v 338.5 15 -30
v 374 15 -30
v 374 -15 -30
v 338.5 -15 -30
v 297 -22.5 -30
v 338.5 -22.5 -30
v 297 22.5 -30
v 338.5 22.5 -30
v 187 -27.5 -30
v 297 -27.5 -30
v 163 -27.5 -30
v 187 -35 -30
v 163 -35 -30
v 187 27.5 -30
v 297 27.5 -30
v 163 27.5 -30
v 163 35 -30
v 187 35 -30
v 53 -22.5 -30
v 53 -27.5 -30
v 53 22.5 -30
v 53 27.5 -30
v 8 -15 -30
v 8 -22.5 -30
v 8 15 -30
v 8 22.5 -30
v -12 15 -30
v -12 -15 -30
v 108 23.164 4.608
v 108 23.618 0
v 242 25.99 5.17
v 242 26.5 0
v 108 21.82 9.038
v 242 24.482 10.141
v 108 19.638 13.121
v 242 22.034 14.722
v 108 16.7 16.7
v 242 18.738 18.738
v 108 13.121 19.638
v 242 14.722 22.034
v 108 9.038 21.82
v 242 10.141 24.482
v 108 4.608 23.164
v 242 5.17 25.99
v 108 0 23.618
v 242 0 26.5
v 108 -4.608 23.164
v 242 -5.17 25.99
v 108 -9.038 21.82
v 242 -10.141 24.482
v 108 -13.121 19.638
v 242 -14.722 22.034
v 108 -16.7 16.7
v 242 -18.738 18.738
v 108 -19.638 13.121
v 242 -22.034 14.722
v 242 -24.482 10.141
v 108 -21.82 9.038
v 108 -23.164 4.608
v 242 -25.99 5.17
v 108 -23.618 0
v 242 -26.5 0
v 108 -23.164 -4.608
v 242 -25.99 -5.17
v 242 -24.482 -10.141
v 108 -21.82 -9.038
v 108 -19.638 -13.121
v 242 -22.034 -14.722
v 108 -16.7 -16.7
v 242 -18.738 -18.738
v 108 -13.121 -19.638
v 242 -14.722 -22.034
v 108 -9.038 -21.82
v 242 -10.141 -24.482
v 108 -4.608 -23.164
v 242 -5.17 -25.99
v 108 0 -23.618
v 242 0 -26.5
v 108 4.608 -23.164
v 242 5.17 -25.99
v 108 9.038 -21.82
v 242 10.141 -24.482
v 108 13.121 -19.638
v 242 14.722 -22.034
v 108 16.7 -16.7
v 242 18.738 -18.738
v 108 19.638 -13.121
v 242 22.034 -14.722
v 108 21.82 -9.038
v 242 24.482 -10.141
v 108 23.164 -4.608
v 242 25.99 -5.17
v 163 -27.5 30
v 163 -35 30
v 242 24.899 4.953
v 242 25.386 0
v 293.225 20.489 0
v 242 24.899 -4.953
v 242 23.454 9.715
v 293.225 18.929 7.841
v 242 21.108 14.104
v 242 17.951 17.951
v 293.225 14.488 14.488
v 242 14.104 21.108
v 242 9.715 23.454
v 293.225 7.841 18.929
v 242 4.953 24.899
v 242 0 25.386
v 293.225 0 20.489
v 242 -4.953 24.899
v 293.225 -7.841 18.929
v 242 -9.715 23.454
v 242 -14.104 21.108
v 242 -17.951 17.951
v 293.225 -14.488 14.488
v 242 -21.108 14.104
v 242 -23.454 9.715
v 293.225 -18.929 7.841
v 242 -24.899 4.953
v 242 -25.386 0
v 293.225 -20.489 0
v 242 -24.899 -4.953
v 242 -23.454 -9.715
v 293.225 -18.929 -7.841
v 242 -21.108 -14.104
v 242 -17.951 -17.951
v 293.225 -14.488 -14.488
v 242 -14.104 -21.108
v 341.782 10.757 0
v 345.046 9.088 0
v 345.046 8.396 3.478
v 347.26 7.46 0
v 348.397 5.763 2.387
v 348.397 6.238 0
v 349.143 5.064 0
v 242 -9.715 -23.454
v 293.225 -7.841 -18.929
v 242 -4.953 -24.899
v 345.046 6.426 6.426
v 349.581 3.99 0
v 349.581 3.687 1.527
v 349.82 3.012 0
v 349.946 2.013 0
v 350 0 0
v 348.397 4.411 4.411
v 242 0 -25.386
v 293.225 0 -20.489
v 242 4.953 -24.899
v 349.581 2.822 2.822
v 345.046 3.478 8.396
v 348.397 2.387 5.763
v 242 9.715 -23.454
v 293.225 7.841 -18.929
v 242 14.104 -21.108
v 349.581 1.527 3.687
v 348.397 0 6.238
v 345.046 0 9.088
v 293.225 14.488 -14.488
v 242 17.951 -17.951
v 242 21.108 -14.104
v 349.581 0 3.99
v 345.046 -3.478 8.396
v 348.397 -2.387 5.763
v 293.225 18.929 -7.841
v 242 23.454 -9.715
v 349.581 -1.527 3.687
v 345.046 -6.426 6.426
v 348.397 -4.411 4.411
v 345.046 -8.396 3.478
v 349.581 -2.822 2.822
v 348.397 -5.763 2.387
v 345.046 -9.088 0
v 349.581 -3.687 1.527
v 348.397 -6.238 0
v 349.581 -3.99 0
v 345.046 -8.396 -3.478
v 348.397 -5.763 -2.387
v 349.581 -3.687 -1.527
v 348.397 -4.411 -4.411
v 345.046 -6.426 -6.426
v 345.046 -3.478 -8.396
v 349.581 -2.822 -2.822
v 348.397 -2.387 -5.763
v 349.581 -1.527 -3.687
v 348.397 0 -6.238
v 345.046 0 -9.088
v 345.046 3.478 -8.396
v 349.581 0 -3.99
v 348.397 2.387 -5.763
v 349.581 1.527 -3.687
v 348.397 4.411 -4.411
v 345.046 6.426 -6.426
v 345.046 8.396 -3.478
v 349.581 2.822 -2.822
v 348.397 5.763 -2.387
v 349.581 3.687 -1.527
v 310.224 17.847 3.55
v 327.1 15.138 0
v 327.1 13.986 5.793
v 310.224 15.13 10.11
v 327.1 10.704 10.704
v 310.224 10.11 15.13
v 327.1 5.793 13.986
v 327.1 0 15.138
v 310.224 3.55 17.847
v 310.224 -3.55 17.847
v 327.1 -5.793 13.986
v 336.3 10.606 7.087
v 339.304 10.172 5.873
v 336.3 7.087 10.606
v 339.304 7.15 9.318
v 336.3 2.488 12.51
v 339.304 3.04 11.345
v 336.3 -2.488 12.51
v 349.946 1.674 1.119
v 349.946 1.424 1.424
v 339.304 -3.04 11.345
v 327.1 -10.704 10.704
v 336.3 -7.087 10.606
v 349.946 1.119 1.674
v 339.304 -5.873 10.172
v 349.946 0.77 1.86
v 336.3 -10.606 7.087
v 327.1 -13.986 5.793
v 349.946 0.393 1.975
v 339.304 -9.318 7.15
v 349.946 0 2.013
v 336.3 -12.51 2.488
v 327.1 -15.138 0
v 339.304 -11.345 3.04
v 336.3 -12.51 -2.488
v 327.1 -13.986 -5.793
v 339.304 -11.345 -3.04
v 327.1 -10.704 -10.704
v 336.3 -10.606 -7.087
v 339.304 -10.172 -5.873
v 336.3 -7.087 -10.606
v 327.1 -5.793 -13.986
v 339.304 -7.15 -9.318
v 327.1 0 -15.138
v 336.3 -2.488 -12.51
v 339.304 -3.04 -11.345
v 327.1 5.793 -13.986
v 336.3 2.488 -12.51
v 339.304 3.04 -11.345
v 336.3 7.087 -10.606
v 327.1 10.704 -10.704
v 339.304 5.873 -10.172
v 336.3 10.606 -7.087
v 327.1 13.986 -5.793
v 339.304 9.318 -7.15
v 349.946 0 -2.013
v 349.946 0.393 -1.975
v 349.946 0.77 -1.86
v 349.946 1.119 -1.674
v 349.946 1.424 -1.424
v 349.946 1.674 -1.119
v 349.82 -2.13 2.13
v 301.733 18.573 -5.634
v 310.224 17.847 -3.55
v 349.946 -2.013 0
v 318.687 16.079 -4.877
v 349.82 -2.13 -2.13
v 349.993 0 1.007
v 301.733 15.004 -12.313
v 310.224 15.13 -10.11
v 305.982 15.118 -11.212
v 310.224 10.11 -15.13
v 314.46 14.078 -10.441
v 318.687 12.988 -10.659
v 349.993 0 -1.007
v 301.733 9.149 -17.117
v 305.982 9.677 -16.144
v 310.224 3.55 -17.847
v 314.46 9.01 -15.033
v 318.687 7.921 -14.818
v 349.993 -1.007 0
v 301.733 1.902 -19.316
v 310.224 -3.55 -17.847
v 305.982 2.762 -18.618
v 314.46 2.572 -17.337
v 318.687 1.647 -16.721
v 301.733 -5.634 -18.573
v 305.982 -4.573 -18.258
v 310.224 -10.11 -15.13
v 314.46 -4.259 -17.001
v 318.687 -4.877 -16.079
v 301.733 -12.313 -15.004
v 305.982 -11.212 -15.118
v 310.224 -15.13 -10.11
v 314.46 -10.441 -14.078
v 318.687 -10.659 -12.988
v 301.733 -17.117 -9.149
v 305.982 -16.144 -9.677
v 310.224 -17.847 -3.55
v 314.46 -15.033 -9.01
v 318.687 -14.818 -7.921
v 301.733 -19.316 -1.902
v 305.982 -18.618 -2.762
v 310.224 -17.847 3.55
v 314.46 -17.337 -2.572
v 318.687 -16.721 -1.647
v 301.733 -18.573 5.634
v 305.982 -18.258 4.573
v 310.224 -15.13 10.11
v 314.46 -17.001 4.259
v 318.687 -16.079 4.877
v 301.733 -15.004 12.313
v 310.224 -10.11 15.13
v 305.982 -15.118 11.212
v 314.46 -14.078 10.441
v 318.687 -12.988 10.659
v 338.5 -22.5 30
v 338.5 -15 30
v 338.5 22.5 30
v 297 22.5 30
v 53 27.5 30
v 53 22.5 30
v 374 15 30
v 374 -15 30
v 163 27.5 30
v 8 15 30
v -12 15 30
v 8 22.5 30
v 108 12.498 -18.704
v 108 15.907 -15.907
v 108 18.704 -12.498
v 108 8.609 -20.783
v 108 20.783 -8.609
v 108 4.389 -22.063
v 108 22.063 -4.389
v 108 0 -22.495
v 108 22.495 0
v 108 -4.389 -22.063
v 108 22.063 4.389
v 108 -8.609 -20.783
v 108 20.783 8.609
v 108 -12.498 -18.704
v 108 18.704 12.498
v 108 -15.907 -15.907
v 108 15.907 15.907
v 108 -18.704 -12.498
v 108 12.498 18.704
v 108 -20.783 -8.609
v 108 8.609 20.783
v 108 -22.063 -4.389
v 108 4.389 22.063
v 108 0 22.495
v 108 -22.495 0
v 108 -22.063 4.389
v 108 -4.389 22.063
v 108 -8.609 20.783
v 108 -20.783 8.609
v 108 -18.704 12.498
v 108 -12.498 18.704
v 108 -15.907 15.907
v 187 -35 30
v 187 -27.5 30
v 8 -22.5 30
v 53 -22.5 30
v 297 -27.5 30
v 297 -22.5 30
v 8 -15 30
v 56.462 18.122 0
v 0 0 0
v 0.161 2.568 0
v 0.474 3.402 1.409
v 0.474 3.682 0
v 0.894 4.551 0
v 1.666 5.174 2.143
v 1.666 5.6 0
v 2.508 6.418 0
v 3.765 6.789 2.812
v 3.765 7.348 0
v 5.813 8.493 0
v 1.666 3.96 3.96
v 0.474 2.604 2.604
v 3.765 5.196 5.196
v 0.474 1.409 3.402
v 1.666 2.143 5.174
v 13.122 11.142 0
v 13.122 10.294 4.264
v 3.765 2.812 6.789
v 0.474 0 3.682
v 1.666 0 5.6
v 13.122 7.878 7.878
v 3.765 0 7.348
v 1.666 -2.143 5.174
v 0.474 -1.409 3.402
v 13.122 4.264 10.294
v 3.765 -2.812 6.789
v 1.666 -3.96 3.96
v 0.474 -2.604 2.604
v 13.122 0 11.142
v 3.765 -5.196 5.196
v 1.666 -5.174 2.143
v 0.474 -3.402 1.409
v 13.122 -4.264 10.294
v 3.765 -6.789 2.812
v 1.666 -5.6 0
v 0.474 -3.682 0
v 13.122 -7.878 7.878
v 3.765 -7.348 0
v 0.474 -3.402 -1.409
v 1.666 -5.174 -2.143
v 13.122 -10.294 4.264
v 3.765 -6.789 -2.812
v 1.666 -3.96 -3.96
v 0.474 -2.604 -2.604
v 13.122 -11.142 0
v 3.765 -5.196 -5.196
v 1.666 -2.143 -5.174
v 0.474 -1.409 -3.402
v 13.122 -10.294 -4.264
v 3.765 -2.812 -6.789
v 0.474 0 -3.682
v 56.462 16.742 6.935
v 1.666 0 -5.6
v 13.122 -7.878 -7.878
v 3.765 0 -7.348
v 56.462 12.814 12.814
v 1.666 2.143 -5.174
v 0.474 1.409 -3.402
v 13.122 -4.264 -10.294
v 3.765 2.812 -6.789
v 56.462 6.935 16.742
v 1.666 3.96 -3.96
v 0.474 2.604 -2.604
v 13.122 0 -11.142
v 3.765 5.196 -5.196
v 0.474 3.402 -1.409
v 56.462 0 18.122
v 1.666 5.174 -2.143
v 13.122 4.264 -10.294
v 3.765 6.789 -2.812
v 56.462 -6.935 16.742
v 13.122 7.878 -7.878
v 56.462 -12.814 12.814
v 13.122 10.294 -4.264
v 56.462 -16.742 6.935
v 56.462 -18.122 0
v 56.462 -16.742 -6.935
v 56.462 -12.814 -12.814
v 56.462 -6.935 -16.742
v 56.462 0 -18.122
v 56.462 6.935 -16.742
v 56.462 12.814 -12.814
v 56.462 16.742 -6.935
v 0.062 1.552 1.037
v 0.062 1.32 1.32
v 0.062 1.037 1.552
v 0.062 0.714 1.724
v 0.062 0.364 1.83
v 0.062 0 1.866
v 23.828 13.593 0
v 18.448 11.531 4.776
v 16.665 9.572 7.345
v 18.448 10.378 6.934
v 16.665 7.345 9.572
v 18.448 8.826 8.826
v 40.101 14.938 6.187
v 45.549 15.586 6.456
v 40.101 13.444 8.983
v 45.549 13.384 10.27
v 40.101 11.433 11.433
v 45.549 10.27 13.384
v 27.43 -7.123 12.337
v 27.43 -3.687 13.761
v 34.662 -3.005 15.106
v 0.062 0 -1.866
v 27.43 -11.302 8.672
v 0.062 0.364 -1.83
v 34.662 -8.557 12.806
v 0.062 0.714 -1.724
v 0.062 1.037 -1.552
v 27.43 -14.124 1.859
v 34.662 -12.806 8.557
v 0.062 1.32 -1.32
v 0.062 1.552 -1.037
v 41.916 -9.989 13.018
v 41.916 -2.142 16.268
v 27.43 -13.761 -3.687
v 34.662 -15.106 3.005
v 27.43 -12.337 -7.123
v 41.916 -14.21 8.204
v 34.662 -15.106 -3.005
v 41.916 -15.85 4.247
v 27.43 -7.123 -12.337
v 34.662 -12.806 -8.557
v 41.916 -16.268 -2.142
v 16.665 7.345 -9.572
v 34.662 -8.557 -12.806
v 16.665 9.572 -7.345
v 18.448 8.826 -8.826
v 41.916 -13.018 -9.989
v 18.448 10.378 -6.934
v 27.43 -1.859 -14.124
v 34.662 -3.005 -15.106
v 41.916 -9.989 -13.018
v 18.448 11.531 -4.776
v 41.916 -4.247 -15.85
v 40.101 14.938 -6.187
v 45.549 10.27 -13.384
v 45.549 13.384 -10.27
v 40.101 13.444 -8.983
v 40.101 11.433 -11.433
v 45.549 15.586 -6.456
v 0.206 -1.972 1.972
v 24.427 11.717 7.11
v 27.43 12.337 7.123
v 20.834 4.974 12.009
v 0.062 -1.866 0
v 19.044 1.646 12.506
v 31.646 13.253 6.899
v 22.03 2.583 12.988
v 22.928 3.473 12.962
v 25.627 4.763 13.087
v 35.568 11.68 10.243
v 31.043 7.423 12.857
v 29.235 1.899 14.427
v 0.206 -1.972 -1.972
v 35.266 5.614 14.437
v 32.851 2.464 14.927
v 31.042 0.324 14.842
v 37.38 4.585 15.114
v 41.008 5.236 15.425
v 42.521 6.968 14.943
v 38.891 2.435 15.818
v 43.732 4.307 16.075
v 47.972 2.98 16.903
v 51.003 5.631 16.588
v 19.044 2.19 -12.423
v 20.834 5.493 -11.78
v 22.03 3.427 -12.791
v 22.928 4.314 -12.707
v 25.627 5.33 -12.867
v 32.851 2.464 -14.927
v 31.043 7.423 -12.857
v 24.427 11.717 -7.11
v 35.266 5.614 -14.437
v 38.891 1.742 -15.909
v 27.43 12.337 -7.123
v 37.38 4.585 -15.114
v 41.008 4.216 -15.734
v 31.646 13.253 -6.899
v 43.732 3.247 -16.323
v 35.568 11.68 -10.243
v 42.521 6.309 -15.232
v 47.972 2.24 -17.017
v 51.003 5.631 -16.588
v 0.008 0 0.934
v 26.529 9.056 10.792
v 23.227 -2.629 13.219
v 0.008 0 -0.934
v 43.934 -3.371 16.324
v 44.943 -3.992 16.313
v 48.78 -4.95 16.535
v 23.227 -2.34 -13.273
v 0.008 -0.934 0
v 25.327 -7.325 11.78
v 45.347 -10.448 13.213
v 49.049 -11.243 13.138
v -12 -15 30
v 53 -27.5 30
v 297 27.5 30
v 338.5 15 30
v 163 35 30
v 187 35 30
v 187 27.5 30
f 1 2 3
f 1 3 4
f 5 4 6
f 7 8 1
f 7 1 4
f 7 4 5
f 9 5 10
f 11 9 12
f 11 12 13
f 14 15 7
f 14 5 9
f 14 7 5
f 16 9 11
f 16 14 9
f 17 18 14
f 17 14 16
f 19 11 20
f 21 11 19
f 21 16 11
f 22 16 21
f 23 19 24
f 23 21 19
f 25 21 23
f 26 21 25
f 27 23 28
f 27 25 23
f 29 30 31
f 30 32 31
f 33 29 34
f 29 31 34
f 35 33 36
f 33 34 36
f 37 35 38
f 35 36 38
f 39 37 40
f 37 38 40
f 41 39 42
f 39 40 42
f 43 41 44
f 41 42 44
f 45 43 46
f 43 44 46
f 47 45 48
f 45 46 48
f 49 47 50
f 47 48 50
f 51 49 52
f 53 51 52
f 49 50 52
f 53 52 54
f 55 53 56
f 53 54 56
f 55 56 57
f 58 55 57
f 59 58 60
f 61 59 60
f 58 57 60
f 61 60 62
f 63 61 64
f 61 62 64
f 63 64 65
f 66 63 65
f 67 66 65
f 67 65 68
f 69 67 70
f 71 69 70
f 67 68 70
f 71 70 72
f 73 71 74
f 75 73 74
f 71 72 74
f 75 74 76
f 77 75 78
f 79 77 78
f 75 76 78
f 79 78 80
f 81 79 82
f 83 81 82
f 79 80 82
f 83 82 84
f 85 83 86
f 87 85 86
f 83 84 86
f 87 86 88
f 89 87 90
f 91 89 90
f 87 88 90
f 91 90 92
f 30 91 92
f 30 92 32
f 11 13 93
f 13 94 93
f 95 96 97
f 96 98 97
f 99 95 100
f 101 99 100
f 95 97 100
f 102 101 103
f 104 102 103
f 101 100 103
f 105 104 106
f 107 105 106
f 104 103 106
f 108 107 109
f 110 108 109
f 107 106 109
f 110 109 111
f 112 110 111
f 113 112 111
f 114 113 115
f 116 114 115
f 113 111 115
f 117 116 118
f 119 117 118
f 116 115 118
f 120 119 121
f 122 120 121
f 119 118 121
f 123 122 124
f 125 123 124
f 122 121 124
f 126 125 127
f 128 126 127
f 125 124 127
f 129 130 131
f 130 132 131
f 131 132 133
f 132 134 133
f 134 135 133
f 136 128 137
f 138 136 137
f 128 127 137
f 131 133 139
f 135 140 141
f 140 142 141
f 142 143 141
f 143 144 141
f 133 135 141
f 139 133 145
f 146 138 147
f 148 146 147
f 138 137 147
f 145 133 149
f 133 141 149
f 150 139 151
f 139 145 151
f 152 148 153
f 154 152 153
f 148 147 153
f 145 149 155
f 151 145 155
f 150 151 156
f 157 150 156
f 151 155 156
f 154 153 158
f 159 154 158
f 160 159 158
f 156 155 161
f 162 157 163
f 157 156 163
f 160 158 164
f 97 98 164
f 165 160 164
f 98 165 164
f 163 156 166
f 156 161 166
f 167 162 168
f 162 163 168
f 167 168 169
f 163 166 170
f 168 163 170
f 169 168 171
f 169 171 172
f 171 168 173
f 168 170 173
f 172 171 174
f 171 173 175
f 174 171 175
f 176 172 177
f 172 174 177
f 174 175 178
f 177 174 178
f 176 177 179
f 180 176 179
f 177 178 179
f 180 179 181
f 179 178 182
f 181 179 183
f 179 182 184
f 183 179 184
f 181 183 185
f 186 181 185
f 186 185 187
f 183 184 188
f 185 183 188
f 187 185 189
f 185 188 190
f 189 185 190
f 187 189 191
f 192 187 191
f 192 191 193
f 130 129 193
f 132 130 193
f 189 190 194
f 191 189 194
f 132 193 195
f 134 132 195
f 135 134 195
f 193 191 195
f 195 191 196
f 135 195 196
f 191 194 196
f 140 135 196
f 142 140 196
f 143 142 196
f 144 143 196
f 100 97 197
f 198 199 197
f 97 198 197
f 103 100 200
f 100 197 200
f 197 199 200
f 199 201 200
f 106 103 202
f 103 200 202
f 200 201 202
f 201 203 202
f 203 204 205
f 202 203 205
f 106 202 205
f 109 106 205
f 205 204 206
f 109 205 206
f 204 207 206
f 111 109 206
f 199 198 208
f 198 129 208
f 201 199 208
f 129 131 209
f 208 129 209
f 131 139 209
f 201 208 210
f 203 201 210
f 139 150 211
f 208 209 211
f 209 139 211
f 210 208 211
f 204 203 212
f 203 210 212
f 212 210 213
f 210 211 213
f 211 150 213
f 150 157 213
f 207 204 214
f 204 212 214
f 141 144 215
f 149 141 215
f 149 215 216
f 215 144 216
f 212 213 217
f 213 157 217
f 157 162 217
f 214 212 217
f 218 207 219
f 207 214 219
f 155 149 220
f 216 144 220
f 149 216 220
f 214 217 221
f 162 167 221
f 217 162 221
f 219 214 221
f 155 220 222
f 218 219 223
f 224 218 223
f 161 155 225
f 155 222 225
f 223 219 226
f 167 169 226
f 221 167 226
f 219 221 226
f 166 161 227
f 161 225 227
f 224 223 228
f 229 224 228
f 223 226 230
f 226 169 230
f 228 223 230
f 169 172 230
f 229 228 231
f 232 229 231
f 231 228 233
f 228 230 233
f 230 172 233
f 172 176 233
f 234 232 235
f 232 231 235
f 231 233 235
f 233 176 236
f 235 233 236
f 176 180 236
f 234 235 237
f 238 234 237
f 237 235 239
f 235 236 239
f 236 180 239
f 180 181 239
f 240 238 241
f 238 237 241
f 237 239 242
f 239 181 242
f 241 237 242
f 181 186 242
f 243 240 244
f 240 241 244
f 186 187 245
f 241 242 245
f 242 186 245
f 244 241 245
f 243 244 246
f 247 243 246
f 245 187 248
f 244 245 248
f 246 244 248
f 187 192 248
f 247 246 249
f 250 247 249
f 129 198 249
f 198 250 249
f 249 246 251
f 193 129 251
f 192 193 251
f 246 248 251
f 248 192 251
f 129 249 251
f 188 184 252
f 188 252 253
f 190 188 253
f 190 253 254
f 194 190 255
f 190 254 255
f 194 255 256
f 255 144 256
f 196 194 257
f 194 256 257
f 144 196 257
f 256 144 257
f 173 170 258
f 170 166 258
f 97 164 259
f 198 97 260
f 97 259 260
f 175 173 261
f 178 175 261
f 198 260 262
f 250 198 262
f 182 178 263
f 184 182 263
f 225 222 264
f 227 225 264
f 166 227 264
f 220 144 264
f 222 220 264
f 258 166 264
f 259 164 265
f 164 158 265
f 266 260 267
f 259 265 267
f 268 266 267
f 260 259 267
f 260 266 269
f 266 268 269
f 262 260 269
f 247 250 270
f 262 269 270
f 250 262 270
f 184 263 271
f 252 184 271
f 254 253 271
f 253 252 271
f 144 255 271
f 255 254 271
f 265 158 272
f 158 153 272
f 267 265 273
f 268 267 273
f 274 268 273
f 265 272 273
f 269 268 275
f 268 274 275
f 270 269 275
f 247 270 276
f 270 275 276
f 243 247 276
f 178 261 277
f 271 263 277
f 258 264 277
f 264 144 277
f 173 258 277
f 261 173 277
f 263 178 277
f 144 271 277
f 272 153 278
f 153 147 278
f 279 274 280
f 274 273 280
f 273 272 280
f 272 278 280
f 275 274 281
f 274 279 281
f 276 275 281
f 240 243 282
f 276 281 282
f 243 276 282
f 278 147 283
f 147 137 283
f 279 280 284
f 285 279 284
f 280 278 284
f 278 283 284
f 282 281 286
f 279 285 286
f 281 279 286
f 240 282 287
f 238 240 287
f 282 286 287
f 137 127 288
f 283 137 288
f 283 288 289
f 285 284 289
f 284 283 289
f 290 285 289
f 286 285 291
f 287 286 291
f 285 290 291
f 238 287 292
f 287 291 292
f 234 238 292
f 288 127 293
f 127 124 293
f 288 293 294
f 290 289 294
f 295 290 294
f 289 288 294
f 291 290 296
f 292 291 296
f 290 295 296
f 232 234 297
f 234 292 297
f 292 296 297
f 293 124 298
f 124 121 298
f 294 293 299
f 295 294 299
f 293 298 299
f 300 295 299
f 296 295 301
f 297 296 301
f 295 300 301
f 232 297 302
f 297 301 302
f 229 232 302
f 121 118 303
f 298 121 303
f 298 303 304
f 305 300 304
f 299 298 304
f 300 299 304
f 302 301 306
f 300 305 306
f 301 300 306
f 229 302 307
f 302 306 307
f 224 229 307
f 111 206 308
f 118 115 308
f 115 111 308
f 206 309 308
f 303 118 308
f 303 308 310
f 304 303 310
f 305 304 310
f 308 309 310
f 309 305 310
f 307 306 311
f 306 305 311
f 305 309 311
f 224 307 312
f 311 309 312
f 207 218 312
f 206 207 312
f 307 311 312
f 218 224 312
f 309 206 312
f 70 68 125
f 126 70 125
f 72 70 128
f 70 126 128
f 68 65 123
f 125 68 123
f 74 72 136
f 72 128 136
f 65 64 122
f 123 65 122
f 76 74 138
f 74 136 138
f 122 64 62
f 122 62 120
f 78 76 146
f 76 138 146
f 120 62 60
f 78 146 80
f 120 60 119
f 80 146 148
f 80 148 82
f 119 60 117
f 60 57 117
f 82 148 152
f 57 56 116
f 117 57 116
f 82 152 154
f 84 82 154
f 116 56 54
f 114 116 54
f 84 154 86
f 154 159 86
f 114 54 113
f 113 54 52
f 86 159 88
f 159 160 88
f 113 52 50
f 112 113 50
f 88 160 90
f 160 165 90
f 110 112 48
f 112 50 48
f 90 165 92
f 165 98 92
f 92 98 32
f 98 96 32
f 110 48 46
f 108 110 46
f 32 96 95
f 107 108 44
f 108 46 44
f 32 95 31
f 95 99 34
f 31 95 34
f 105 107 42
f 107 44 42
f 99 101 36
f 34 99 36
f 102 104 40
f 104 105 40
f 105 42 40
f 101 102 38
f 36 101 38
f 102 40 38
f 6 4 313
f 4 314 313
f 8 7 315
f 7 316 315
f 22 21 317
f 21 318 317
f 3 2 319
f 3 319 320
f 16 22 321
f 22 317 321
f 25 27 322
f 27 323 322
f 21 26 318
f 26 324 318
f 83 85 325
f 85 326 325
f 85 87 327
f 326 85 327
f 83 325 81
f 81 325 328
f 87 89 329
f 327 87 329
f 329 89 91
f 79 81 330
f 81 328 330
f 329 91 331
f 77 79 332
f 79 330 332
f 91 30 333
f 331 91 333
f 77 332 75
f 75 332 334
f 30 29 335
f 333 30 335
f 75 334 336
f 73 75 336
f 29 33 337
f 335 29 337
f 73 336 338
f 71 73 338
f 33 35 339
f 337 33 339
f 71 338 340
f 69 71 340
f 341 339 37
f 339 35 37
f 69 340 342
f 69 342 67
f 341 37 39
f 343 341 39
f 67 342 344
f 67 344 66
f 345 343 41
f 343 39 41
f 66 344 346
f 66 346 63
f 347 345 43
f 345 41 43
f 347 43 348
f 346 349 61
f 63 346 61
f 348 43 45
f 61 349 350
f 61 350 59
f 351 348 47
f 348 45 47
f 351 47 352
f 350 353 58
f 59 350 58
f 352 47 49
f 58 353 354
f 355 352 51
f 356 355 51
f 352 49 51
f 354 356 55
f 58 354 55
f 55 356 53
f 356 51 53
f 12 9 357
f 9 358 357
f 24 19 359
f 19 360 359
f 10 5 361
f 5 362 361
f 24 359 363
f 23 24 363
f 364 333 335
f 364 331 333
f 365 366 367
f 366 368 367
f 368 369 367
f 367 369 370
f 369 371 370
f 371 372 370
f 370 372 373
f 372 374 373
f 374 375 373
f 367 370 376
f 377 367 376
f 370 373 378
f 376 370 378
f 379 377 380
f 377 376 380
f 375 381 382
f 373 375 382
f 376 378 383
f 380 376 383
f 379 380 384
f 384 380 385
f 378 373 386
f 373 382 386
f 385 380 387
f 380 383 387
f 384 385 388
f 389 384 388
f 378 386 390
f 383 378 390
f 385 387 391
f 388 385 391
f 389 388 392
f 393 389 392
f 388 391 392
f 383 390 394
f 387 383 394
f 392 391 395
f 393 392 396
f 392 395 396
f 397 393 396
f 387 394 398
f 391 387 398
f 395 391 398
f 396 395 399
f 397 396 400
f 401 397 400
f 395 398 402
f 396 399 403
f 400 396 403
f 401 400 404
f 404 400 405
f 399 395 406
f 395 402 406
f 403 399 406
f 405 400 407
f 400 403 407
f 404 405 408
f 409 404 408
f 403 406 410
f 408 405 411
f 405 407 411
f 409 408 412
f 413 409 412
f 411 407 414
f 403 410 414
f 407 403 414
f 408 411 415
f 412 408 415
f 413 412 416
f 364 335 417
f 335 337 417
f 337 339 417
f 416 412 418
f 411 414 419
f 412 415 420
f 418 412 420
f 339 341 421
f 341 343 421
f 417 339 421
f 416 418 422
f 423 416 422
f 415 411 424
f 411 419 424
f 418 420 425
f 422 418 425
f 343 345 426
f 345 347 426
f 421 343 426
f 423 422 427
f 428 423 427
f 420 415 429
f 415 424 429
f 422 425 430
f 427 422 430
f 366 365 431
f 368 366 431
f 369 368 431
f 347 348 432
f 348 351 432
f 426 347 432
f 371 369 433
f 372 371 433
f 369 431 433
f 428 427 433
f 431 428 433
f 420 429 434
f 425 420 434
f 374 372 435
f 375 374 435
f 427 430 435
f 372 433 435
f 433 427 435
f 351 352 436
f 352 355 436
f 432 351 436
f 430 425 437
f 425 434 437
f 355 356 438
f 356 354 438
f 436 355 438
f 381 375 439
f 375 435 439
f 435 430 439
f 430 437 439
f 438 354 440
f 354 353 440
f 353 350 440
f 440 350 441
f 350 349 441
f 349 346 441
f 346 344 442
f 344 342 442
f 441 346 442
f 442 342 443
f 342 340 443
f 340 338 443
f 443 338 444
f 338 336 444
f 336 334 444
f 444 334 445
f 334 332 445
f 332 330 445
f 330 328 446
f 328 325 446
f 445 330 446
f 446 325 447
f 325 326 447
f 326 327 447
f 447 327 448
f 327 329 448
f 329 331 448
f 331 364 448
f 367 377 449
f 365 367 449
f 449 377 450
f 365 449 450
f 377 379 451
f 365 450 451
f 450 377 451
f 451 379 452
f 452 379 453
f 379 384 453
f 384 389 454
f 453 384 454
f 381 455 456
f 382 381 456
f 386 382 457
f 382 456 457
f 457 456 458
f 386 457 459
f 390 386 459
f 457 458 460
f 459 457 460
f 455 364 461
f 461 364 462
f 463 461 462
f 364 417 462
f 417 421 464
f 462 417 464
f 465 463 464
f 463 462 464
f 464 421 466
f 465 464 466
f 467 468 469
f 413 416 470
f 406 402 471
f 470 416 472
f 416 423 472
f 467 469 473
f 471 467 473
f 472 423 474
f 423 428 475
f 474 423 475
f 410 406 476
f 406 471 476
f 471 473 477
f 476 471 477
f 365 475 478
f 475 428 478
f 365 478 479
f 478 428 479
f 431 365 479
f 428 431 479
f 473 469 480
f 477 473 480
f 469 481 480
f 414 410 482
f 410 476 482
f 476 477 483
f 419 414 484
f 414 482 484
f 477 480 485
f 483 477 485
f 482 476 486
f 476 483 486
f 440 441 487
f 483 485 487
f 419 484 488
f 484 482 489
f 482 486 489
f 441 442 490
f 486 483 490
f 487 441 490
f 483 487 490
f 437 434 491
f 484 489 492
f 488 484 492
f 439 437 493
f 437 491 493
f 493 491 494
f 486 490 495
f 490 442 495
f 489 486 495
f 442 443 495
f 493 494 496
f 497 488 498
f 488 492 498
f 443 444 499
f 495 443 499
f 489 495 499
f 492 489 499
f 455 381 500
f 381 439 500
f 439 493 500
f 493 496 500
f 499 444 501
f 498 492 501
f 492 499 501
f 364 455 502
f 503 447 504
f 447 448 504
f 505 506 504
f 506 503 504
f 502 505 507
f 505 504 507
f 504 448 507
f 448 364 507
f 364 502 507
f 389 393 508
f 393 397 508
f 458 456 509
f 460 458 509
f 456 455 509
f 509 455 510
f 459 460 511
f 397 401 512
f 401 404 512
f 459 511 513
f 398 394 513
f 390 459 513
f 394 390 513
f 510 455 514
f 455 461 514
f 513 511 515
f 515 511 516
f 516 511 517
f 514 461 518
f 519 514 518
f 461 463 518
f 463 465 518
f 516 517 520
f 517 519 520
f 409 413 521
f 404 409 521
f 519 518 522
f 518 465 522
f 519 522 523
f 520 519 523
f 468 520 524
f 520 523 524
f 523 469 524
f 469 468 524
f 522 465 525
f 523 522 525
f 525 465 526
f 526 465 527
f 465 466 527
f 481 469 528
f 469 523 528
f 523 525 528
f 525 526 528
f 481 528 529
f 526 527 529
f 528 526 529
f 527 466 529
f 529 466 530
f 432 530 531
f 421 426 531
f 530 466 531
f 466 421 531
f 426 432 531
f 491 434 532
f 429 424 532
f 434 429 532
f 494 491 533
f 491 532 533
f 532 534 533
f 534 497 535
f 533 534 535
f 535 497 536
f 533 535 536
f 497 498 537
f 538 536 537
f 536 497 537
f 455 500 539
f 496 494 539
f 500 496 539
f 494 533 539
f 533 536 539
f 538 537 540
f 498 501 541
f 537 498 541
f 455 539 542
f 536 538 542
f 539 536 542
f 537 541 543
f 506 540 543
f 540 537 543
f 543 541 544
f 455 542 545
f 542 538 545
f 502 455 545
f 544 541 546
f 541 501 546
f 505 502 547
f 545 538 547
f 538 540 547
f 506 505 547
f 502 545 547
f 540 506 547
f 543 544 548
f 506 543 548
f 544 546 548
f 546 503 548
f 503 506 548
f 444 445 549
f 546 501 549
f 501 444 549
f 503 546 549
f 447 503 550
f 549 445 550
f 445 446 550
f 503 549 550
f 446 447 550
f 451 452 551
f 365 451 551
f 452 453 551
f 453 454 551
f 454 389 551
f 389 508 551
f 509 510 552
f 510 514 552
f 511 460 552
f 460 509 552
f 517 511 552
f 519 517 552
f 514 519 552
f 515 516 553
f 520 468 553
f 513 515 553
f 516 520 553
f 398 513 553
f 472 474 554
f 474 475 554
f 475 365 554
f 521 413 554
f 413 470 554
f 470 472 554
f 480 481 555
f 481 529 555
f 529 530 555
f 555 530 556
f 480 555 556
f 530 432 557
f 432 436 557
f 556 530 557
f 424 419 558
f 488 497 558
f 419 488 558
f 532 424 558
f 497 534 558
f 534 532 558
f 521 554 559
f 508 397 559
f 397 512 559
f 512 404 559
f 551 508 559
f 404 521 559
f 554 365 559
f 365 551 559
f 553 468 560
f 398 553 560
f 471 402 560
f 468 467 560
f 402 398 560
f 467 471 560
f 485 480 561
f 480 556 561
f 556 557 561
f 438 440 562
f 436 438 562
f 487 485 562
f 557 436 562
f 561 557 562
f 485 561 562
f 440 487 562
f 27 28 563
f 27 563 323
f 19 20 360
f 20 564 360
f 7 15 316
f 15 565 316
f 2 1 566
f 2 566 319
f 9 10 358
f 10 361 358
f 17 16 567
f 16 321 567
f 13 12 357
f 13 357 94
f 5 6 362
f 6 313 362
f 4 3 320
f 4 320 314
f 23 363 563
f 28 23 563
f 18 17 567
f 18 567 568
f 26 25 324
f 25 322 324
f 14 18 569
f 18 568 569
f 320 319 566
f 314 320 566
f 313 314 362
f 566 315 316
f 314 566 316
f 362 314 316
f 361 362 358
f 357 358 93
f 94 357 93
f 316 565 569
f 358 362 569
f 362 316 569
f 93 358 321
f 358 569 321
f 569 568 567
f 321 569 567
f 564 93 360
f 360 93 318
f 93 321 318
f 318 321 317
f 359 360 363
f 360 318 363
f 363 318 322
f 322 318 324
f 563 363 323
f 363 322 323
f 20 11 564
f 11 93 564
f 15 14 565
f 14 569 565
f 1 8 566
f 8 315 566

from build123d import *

# Parameters (mm, degrees)
BOSS_EXTRUDE1_DEPTH      = 30
BOSS_EXTRUDE1_DEPTH_BACK = 30


with BuildPart() as part:
    # Sketch1 → Boss-Extrude1 (new, two sides: drawn at the far end of the back side and taken through both)
    with BuildSketch(Plane.XY.offset(-BOSS_EXTRUDE1_DEPTH_BACK)):
        Polygon((-12, -15), (-12, 15), (8, 15), (8, 22.5), (53, 22.5), (53, 27.5), (163, 27.5), (163, 35), (187, 35), (187, 27.5), (297, 27.5), (297, 22.5), (338.5, 22.5), (338.5, 15), (374, 15), (374, -15), (338.5, -15), (338.5, -22.5), (297, -22.5), (297, -27.5), (187, -27.5), (187, -35), (163, -35), (163, -27.5), (53, -27.5), (53, -22.5), (8, -22.5), (8, -15), align=None)
    extrude(amount=BOSS_EXTRUDE1_DEPTH + BOSS_EXTRUDE1_DEPTH_BACK)

    # Sketch3 → Cut-Revolve2 (revolve, cut)
    with BuildSketch(Plane.XY):
        with BuildLine():
            Line((108.000005708, 22.495261034), (108.000005708, 23.617924612))
            add(Edge.make_bspline(
                [(108.000005708, 23.617924612), (108.69532236, 23.632492565), (110.134086752, 23.662696241), (114.002675386, 23.744055355), (117.52452678, 23.818734211), (122.62413086, 23.927066751), (127.386175822, 24.028960617), (133.517001276, 24.160489916), (140.669558615, 24.314757893), (149.244027294, 24.50035769), (158.933260023, 24.710843629), (169.003951816, 24.929828541), (178.945846596, 25.146047878), (189.059333627, 25.365529494), (198.913066308, 25.578918803), (209.188065069, 25.800360703), (218.243647, 25.994865885), (227.18153574, 26.185528835), (233.191375828, 26.313403618), (238.874035778, 26.433622484), (240.957024273, 26.477631494), (241.999996023, 26.499636974)],
                knots=[0.083332146, 0.083332146, 0.083332146, 0.083332146, 0.083332146, 0.104087624, 0.126568088, 0.157701305, 0.188834523, 0.21996774, 0.251100957, 0.30685696, 0.369123394, 0.431389829, 0.493656263, 0.555922697, 0.618189132, 0.680455566, 0.742722, 0.804988435, 0.85440094, 0.885534157, 0.916667375, 0.916667375, 0.916667375, 0.916667375, 0.916667375], degree=4))
            Line((241.999996023, 26.499636974), (241.999996023, 25.386328483))
            add(Edge.make_bspline(
                [(241.999996023, 25.386328483), (242.997689398, 25.308156454), (244.990789981, 25.150456292), (248.314178963, 24.884174364), (251.097793918, 24.652630256), (254.096338207, 24.40199426), (256.115950151, 24.228401113), (258.395425806, 24.031542714), (260.523519631, 23.843523656), (263.272962125, 23.597575487), (267.617740398, 23.199581767), (272.530644228, 22.731603556), (277.969218388, 22.186806055), (284.502123723, 21.495795918), (289.937964032, 20.886548872), (295.372437907, 20.237558818), (301.88455361, 19.401221609), (308.389001931, 18.498768615), (315.959550127, 17.326428718), (324.308730313, 15.802761995), (331.522595168, 14.182607232), (337.270373253, 12.534677442), (341.314142899, 11.019210316), (343.839526129, 9.821610423), (345.557398761, 8.80275637), (346.740922219, 7.936545395), (347.594801698, 7.171388914), (348.227306411, 6.479610121), (348.723002975, 5.813945223), (349.119004405, 5.147021841), (349.440992029, 4.441727447), (349.699673959, 3.650874012), (349.887237793, 2.736043875), (349.971487339, 1.848234223), (349.997159077, 1.02099573), (350.000343601, 0.437547408), (350.000420527, 0.145847197), (350, 0)],
                knots=[0.085539691, 0.085539691, 0.085539691, 0.085539691, 0.085539691, 0.120111184, 0.154682677, 0.171968424, 0.189254171, 0.206539917, 0.223825664, 0.241111411, 0.258397158, 0.292968652, 0.362111638, 0.396683132, 0.431254625, 0.500397611, 0.534969105, 0.5695406, 0.638683586, 0.707826572, 0.776969547, 0.837594824, 0.8721664, 0.896549847, 0.913250965, 0.925776395, 0.935170687, 0.942808737, 0.949414163, 0.955338894, 0.96134561, 0.967265833, 0.973858415, 0.981569814, 0.990784907, 0.995392454, 1, 1, 1, 1, 1], degree=4))
            Line((350, 0), (0, 0))
            add(Edge.make_bspline(
                [(0, 0), (-0.00035577, 0.120277327), (-0.00031082, 0.360836588), (0.002299922, 0.841992826), (0.022856294, 1.520243321), (0.089579031, 2.24292924), (0.236719839, 2.986493577), (0.43616989, 3.622237895), (0.687299533, 4.198977779), (1.002920086, 4.75468844), (1.407889824, 5.319720548), (1.939569813, 5.917175139), (2.658583589, 6.573081931), (3.67793434, 7.327261742), (5.178835477, 8.218030187), (7.500122996, 9.307468959), (11.351007882, 10.703965668), (16.999713662, 12.236154029), (24.236498755, 13.742442968), (32.666050698, 15.149254822), (41.486862914, 16.386268296), (49.223740463, 17.330086994), (55.862579827, 18.066429658), (61.400762894, 18.639952996), (65.830769492, 19.077356076), (70.267988209, 19.496098455), (74.697234615, 19.8971343), (79.144191725, 20.283849996), (83.564092337, 20.654572527), (87.478187448, 20.970893), (90.760753774, 21.229595839), (93.610940803, 21.448494052), (95.697915689, 21.607520734), (98.724377463, 21.832083001), (101.588044864, 22.043264026), (104.94931787, 22.282042977), (106.985221031, 22.424804888), (108.000005708, 22.495261034)],
                knots=[0, 0, 0, 0, 0, 0.003837631, 0.007675261, 0.015350522, 0.021646811, 0.026957895, 0.031813386, 0.036568429, 0.041680559, 0.047310658, 0.053953193, 0.062039099, 0.07267917, 0.087698911, 0.109550262, 0.143736552, 0.203218265, 0.274262491, 0.345306722, 0.416350952, 0.487395185, 0.522917301, 0.558439418, 0.593961534, 0.629483651, 0.665005767, 0.700527884, 0.73605, 0.771572117, 0.789333175, 0.807094233, 0.824855291, 0.842616349, 0.878138465, 0.913660582, 0.913660582, 0.913660582, 0.913660582, 0.913660582], degree=4))
        make_face()
    revolve(axis=Axis((-1000, 0, 0), (1, 0, 0)), mode=Mode.SUBTRACT)


solid = part.part
